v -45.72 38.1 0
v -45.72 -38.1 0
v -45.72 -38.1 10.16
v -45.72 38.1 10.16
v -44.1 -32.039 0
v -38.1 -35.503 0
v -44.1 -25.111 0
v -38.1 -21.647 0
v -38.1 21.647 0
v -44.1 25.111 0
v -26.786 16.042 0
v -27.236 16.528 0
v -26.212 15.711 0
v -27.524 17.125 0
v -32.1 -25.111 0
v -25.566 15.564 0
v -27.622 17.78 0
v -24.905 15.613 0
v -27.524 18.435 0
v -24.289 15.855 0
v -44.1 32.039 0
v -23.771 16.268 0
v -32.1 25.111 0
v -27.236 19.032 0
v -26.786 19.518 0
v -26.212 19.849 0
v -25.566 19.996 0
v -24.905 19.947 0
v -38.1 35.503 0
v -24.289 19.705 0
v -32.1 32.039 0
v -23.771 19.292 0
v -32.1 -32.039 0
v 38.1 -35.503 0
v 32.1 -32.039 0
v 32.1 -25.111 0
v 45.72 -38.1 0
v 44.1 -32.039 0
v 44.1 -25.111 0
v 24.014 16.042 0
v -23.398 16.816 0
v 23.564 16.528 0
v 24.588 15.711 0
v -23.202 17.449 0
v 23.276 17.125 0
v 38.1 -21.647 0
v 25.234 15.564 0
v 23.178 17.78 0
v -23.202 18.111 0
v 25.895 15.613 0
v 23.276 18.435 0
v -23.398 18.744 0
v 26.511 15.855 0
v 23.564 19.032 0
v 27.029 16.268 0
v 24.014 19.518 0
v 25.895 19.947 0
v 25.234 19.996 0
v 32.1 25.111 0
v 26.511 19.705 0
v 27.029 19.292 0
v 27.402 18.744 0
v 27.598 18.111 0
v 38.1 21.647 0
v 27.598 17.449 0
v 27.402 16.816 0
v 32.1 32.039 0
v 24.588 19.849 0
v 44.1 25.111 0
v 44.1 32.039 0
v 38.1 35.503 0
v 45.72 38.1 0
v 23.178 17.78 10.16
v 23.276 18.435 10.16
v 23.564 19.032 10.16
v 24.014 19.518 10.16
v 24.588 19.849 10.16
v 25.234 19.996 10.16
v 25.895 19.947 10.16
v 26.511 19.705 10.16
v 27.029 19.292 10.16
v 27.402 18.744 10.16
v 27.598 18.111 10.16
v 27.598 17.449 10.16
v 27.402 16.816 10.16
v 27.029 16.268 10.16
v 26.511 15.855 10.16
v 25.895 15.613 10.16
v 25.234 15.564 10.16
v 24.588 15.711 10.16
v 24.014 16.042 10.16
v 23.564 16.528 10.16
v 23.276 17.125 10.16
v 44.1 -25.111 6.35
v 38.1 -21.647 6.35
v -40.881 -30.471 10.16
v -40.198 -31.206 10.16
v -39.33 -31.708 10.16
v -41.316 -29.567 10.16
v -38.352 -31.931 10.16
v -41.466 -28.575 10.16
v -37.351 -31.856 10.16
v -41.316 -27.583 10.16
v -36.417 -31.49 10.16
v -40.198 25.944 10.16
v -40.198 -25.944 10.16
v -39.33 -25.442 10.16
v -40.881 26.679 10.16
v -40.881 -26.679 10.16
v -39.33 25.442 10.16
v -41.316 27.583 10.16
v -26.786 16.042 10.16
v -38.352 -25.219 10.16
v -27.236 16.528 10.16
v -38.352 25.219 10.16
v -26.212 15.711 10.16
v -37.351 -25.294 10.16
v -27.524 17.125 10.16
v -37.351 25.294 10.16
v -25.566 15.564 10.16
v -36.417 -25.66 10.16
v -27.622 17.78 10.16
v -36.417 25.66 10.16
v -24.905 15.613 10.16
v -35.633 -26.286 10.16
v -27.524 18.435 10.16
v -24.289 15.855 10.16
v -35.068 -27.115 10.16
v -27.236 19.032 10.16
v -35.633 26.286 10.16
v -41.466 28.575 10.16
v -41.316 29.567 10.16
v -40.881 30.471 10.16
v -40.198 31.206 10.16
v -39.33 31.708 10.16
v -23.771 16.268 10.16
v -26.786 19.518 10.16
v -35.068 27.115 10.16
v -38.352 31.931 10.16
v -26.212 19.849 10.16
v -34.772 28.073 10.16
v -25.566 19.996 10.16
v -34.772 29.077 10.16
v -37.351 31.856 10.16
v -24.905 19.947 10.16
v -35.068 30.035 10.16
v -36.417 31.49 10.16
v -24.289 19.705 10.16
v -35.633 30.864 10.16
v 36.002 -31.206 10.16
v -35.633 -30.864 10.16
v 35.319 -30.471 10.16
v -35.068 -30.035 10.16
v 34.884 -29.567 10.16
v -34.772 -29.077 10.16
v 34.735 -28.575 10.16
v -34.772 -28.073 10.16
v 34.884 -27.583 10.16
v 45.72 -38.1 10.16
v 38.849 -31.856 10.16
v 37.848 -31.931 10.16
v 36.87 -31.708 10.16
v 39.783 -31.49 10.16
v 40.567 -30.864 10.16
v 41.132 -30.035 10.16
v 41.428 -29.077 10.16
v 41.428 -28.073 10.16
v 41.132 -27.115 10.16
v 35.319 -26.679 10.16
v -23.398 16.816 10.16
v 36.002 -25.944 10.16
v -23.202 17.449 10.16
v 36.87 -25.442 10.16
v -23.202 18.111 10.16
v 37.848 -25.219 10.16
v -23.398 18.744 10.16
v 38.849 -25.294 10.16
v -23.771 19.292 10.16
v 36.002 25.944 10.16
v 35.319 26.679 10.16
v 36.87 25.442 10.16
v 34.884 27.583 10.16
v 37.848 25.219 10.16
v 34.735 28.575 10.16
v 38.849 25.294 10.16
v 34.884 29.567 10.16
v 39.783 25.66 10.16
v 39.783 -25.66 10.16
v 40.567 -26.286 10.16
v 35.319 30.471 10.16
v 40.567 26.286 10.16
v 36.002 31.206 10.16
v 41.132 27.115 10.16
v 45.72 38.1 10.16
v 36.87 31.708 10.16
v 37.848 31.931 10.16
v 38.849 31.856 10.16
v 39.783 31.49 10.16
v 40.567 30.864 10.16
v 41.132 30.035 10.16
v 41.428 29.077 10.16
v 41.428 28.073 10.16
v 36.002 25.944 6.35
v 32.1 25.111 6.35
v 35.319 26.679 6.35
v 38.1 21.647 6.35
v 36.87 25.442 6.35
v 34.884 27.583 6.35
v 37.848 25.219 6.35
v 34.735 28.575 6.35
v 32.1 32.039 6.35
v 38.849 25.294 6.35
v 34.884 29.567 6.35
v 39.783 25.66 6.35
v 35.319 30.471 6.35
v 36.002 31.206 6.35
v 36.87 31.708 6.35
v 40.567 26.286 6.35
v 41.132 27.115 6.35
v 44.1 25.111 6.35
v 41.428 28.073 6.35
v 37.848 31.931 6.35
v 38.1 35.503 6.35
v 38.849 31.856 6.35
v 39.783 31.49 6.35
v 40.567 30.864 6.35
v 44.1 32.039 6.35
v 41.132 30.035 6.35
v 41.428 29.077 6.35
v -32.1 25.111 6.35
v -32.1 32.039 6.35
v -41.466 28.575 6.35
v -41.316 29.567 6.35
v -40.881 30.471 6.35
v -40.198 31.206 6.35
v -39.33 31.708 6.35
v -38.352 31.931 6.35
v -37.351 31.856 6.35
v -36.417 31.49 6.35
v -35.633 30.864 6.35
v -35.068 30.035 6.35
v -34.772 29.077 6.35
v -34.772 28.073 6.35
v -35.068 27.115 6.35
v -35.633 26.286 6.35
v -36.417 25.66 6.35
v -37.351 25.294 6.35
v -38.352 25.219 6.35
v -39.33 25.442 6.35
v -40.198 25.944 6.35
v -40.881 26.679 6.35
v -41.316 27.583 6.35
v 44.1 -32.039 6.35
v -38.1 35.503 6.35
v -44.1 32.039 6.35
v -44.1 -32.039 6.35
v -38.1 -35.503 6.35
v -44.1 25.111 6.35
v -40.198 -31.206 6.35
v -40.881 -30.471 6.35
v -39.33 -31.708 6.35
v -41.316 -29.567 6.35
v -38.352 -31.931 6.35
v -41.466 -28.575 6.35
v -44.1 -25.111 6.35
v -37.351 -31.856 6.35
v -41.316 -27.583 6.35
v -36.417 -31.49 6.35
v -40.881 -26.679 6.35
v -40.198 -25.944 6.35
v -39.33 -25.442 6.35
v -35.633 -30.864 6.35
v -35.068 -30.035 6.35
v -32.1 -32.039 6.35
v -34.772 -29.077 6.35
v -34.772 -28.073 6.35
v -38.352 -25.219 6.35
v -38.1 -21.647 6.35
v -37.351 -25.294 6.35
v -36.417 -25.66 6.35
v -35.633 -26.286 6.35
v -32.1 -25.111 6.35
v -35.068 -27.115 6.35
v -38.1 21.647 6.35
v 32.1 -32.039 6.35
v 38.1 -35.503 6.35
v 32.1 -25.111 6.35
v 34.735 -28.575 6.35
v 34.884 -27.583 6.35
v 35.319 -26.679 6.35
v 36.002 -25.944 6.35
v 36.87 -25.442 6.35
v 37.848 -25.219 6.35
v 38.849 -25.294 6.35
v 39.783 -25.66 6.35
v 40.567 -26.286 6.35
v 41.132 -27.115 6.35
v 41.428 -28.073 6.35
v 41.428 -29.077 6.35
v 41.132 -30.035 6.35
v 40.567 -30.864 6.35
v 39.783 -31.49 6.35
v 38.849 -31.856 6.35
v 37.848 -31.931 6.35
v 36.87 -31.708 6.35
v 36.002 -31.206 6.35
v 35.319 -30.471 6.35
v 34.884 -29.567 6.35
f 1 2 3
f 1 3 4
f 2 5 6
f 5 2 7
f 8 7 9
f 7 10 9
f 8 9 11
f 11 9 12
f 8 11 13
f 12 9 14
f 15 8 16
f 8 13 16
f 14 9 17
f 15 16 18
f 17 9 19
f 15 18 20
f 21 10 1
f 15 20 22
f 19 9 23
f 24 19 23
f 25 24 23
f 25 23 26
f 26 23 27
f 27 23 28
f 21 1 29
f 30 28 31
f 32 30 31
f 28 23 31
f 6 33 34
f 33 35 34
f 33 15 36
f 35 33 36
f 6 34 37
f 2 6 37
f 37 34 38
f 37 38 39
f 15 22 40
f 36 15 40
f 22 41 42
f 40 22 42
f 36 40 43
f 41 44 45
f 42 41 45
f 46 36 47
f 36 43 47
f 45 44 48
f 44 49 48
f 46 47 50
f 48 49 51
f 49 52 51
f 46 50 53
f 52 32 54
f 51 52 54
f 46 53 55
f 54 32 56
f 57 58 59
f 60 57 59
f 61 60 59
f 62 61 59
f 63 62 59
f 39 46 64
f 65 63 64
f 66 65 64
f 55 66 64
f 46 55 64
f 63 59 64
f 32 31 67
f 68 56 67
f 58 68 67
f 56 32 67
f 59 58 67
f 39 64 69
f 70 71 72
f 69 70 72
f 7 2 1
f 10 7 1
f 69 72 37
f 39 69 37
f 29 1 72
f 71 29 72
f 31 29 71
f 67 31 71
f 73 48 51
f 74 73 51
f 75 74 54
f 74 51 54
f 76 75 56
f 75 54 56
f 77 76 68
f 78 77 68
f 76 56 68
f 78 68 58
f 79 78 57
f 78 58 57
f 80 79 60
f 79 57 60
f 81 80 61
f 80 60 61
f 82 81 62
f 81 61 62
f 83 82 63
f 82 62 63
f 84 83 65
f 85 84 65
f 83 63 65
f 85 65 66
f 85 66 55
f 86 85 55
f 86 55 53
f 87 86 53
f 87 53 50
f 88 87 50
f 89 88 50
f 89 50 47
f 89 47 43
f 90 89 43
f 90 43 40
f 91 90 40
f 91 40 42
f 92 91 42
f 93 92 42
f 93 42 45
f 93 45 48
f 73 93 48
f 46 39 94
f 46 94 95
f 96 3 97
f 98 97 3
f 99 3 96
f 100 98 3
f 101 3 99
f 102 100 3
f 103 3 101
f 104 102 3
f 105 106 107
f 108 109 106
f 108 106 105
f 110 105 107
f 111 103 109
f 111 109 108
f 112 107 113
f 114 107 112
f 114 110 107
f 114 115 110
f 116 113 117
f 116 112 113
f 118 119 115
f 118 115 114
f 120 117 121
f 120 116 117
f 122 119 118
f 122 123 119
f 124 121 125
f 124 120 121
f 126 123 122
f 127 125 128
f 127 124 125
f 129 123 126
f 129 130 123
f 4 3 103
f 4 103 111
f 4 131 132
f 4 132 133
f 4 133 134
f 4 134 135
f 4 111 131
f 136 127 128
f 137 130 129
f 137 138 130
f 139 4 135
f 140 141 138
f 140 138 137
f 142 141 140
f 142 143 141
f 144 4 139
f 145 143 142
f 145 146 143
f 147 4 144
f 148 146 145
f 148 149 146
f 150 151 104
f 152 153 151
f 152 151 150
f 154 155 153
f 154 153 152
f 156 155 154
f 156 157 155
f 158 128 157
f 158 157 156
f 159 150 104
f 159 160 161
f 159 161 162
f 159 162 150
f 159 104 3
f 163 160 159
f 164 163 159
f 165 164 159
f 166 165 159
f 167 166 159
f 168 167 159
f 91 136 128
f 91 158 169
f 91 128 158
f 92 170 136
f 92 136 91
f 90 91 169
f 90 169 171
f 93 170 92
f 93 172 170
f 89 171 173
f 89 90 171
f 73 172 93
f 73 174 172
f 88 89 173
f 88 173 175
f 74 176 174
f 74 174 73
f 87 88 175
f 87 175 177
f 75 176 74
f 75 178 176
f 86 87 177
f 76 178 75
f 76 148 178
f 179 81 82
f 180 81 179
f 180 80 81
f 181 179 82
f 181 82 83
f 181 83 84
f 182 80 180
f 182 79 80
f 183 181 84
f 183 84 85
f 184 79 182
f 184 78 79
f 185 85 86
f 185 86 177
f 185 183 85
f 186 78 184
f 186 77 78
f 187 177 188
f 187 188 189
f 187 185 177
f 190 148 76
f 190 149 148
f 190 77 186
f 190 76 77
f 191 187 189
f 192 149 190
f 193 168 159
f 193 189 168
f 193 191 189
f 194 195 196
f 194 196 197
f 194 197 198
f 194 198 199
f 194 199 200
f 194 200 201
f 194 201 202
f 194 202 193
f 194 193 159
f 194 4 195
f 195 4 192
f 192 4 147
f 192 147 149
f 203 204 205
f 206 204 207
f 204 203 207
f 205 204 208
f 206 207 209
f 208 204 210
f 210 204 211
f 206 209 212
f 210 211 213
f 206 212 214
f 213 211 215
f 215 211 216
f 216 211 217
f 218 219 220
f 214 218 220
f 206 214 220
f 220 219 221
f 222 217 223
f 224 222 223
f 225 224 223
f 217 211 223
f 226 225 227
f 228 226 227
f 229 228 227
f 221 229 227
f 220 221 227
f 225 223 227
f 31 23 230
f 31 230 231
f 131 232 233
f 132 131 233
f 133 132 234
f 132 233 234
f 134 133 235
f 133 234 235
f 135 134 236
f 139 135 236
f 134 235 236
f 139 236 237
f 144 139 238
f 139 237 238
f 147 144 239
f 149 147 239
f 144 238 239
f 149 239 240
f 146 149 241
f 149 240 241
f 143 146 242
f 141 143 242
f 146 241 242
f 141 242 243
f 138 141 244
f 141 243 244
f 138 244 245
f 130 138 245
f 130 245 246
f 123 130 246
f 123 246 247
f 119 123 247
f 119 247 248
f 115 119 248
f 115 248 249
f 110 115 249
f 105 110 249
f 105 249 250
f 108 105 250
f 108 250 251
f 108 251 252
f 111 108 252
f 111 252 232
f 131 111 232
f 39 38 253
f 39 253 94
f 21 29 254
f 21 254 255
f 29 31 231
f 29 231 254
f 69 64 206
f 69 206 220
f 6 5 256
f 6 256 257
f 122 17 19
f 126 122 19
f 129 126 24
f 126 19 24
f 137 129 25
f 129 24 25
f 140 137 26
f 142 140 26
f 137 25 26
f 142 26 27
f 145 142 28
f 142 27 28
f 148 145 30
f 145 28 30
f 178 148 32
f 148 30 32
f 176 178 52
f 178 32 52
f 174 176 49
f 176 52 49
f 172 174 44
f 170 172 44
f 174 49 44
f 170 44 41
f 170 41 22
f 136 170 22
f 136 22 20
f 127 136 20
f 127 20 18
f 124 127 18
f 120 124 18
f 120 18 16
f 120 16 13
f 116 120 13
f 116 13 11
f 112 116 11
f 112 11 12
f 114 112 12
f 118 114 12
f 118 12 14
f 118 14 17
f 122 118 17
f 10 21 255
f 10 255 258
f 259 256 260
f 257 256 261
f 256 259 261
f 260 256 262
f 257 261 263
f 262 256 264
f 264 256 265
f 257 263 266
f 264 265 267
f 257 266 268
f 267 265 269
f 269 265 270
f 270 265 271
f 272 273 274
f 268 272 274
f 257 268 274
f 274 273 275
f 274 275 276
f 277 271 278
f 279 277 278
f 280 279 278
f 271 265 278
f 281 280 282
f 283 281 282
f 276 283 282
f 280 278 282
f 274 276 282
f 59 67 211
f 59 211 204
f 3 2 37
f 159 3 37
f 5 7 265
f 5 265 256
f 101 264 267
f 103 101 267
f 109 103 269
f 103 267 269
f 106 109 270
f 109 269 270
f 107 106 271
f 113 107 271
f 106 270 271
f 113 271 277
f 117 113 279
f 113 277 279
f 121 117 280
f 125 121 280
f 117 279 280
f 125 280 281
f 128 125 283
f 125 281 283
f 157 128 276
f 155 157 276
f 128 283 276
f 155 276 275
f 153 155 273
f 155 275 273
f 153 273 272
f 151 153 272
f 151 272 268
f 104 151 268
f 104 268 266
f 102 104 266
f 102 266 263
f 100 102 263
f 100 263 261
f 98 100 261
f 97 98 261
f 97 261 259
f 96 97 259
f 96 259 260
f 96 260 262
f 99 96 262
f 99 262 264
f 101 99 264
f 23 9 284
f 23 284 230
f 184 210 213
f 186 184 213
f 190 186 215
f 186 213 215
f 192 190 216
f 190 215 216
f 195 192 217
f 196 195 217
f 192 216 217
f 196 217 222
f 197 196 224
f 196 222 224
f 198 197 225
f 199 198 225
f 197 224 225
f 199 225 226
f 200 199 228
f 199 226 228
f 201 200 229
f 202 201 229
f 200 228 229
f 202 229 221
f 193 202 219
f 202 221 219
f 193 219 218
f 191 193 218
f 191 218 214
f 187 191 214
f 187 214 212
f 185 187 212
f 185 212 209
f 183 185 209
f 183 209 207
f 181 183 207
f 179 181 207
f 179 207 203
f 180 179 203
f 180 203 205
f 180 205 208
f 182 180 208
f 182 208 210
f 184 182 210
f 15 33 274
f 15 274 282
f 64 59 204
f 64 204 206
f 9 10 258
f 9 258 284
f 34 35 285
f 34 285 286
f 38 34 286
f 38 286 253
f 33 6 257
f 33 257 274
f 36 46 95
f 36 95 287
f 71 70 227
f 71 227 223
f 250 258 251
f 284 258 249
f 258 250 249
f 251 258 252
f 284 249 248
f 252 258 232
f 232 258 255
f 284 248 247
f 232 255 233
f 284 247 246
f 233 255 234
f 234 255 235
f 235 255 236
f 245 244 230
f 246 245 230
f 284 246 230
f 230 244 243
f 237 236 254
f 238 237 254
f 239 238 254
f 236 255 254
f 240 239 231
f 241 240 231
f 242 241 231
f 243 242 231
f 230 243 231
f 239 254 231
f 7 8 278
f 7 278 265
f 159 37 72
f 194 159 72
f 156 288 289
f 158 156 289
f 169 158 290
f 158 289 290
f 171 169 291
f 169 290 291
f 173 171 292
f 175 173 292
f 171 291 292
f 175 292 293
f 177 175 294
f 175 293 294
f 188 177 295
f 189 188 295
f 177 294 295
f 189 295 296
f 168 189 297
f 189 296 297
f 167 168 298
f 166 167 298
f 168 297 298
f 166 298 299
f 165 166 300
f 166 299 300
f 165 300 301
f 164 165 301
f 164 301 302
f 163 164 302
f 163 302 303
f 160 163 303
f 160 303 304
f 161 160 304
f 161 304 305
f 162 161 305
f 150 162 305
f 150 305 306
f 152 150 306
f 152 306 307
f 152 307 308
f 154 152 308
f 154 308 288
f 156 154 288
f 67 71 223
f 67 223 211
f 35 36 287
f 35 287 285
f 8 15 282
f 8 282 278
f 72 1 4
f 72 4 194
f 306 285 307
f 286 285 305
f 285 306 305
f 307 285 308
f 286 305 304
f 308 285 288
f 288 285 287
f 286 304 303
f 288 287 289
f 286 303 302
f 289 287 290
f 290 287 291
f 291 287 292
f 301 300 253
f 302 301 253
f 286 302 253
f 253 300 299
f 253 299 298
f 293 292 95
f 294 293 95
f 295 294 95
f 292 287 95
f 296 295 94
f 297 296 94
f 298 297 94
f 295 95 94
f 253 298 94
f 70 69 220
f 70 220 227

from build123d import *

# Parameters (mm, degrees)
F0_W     = 91.44
F0_H     = 76.2
F1_DEPTH = 10.16
F3_D     = 4.445
F5_D     = 6.731
F7_DEPTH = 6.35


with BuildPart() as f1:
    # F0 (on Top) → F1 (new body)
    with BuildSketch(Plane.XY):
        Rectangle(F0_W, F0_H)
    extrude(amount=F1_DEPTH)

    # F3 (through all)
    with Locations(Plane.XY.offset(10.16)):
        with Locations((-25.4, 17.78), (25.4, 17.78)):
            Hole(F3_D / 2)

    # F5 (through all)
    with Locations(Plane.XY.offset(10.16)):
        with Locations((-38.1, 28.575), (38.1, 28.575), (-38.1, -28.575), (38.1, -28.575)):
            Hole(F5_D / 2)

    # F6 (on face) → F7 (cut)
    with BuildSketch(Plane.XY):
        Polygon((38.1, 35.503203), (32.1, 32.039102), (32.1, 25.110898), (38.1, 21.646797), (44.1, 25.110898), (44.1, 32.039102), align=None)
        Polygon((-44.1, 25.110898), (-38.1, 21.646797), (-32.1, 25.110898), (-32.1, 32.039102), (-38.1, 35.503203), (-44.1, 32.039102), align=None)
        Polygon((44.1, -25.110898), (38.1, -21.646797), (32.1, -25.110898), (32.1, -32.039102), (38.1, -35.503203), (44.1, -32.039102), align=None)
        Polygon((-32.1, -25.110898), (-38.1, -21.646797), (-44.1, -25.110898), (-44.1, -32.039102), (-38.1, -35.503203), (-32.1, -32.039102), align=None)
    extrude(amount=F7_DEPTH, mode=Mode.SUBTRACT)


solid = f1.part
